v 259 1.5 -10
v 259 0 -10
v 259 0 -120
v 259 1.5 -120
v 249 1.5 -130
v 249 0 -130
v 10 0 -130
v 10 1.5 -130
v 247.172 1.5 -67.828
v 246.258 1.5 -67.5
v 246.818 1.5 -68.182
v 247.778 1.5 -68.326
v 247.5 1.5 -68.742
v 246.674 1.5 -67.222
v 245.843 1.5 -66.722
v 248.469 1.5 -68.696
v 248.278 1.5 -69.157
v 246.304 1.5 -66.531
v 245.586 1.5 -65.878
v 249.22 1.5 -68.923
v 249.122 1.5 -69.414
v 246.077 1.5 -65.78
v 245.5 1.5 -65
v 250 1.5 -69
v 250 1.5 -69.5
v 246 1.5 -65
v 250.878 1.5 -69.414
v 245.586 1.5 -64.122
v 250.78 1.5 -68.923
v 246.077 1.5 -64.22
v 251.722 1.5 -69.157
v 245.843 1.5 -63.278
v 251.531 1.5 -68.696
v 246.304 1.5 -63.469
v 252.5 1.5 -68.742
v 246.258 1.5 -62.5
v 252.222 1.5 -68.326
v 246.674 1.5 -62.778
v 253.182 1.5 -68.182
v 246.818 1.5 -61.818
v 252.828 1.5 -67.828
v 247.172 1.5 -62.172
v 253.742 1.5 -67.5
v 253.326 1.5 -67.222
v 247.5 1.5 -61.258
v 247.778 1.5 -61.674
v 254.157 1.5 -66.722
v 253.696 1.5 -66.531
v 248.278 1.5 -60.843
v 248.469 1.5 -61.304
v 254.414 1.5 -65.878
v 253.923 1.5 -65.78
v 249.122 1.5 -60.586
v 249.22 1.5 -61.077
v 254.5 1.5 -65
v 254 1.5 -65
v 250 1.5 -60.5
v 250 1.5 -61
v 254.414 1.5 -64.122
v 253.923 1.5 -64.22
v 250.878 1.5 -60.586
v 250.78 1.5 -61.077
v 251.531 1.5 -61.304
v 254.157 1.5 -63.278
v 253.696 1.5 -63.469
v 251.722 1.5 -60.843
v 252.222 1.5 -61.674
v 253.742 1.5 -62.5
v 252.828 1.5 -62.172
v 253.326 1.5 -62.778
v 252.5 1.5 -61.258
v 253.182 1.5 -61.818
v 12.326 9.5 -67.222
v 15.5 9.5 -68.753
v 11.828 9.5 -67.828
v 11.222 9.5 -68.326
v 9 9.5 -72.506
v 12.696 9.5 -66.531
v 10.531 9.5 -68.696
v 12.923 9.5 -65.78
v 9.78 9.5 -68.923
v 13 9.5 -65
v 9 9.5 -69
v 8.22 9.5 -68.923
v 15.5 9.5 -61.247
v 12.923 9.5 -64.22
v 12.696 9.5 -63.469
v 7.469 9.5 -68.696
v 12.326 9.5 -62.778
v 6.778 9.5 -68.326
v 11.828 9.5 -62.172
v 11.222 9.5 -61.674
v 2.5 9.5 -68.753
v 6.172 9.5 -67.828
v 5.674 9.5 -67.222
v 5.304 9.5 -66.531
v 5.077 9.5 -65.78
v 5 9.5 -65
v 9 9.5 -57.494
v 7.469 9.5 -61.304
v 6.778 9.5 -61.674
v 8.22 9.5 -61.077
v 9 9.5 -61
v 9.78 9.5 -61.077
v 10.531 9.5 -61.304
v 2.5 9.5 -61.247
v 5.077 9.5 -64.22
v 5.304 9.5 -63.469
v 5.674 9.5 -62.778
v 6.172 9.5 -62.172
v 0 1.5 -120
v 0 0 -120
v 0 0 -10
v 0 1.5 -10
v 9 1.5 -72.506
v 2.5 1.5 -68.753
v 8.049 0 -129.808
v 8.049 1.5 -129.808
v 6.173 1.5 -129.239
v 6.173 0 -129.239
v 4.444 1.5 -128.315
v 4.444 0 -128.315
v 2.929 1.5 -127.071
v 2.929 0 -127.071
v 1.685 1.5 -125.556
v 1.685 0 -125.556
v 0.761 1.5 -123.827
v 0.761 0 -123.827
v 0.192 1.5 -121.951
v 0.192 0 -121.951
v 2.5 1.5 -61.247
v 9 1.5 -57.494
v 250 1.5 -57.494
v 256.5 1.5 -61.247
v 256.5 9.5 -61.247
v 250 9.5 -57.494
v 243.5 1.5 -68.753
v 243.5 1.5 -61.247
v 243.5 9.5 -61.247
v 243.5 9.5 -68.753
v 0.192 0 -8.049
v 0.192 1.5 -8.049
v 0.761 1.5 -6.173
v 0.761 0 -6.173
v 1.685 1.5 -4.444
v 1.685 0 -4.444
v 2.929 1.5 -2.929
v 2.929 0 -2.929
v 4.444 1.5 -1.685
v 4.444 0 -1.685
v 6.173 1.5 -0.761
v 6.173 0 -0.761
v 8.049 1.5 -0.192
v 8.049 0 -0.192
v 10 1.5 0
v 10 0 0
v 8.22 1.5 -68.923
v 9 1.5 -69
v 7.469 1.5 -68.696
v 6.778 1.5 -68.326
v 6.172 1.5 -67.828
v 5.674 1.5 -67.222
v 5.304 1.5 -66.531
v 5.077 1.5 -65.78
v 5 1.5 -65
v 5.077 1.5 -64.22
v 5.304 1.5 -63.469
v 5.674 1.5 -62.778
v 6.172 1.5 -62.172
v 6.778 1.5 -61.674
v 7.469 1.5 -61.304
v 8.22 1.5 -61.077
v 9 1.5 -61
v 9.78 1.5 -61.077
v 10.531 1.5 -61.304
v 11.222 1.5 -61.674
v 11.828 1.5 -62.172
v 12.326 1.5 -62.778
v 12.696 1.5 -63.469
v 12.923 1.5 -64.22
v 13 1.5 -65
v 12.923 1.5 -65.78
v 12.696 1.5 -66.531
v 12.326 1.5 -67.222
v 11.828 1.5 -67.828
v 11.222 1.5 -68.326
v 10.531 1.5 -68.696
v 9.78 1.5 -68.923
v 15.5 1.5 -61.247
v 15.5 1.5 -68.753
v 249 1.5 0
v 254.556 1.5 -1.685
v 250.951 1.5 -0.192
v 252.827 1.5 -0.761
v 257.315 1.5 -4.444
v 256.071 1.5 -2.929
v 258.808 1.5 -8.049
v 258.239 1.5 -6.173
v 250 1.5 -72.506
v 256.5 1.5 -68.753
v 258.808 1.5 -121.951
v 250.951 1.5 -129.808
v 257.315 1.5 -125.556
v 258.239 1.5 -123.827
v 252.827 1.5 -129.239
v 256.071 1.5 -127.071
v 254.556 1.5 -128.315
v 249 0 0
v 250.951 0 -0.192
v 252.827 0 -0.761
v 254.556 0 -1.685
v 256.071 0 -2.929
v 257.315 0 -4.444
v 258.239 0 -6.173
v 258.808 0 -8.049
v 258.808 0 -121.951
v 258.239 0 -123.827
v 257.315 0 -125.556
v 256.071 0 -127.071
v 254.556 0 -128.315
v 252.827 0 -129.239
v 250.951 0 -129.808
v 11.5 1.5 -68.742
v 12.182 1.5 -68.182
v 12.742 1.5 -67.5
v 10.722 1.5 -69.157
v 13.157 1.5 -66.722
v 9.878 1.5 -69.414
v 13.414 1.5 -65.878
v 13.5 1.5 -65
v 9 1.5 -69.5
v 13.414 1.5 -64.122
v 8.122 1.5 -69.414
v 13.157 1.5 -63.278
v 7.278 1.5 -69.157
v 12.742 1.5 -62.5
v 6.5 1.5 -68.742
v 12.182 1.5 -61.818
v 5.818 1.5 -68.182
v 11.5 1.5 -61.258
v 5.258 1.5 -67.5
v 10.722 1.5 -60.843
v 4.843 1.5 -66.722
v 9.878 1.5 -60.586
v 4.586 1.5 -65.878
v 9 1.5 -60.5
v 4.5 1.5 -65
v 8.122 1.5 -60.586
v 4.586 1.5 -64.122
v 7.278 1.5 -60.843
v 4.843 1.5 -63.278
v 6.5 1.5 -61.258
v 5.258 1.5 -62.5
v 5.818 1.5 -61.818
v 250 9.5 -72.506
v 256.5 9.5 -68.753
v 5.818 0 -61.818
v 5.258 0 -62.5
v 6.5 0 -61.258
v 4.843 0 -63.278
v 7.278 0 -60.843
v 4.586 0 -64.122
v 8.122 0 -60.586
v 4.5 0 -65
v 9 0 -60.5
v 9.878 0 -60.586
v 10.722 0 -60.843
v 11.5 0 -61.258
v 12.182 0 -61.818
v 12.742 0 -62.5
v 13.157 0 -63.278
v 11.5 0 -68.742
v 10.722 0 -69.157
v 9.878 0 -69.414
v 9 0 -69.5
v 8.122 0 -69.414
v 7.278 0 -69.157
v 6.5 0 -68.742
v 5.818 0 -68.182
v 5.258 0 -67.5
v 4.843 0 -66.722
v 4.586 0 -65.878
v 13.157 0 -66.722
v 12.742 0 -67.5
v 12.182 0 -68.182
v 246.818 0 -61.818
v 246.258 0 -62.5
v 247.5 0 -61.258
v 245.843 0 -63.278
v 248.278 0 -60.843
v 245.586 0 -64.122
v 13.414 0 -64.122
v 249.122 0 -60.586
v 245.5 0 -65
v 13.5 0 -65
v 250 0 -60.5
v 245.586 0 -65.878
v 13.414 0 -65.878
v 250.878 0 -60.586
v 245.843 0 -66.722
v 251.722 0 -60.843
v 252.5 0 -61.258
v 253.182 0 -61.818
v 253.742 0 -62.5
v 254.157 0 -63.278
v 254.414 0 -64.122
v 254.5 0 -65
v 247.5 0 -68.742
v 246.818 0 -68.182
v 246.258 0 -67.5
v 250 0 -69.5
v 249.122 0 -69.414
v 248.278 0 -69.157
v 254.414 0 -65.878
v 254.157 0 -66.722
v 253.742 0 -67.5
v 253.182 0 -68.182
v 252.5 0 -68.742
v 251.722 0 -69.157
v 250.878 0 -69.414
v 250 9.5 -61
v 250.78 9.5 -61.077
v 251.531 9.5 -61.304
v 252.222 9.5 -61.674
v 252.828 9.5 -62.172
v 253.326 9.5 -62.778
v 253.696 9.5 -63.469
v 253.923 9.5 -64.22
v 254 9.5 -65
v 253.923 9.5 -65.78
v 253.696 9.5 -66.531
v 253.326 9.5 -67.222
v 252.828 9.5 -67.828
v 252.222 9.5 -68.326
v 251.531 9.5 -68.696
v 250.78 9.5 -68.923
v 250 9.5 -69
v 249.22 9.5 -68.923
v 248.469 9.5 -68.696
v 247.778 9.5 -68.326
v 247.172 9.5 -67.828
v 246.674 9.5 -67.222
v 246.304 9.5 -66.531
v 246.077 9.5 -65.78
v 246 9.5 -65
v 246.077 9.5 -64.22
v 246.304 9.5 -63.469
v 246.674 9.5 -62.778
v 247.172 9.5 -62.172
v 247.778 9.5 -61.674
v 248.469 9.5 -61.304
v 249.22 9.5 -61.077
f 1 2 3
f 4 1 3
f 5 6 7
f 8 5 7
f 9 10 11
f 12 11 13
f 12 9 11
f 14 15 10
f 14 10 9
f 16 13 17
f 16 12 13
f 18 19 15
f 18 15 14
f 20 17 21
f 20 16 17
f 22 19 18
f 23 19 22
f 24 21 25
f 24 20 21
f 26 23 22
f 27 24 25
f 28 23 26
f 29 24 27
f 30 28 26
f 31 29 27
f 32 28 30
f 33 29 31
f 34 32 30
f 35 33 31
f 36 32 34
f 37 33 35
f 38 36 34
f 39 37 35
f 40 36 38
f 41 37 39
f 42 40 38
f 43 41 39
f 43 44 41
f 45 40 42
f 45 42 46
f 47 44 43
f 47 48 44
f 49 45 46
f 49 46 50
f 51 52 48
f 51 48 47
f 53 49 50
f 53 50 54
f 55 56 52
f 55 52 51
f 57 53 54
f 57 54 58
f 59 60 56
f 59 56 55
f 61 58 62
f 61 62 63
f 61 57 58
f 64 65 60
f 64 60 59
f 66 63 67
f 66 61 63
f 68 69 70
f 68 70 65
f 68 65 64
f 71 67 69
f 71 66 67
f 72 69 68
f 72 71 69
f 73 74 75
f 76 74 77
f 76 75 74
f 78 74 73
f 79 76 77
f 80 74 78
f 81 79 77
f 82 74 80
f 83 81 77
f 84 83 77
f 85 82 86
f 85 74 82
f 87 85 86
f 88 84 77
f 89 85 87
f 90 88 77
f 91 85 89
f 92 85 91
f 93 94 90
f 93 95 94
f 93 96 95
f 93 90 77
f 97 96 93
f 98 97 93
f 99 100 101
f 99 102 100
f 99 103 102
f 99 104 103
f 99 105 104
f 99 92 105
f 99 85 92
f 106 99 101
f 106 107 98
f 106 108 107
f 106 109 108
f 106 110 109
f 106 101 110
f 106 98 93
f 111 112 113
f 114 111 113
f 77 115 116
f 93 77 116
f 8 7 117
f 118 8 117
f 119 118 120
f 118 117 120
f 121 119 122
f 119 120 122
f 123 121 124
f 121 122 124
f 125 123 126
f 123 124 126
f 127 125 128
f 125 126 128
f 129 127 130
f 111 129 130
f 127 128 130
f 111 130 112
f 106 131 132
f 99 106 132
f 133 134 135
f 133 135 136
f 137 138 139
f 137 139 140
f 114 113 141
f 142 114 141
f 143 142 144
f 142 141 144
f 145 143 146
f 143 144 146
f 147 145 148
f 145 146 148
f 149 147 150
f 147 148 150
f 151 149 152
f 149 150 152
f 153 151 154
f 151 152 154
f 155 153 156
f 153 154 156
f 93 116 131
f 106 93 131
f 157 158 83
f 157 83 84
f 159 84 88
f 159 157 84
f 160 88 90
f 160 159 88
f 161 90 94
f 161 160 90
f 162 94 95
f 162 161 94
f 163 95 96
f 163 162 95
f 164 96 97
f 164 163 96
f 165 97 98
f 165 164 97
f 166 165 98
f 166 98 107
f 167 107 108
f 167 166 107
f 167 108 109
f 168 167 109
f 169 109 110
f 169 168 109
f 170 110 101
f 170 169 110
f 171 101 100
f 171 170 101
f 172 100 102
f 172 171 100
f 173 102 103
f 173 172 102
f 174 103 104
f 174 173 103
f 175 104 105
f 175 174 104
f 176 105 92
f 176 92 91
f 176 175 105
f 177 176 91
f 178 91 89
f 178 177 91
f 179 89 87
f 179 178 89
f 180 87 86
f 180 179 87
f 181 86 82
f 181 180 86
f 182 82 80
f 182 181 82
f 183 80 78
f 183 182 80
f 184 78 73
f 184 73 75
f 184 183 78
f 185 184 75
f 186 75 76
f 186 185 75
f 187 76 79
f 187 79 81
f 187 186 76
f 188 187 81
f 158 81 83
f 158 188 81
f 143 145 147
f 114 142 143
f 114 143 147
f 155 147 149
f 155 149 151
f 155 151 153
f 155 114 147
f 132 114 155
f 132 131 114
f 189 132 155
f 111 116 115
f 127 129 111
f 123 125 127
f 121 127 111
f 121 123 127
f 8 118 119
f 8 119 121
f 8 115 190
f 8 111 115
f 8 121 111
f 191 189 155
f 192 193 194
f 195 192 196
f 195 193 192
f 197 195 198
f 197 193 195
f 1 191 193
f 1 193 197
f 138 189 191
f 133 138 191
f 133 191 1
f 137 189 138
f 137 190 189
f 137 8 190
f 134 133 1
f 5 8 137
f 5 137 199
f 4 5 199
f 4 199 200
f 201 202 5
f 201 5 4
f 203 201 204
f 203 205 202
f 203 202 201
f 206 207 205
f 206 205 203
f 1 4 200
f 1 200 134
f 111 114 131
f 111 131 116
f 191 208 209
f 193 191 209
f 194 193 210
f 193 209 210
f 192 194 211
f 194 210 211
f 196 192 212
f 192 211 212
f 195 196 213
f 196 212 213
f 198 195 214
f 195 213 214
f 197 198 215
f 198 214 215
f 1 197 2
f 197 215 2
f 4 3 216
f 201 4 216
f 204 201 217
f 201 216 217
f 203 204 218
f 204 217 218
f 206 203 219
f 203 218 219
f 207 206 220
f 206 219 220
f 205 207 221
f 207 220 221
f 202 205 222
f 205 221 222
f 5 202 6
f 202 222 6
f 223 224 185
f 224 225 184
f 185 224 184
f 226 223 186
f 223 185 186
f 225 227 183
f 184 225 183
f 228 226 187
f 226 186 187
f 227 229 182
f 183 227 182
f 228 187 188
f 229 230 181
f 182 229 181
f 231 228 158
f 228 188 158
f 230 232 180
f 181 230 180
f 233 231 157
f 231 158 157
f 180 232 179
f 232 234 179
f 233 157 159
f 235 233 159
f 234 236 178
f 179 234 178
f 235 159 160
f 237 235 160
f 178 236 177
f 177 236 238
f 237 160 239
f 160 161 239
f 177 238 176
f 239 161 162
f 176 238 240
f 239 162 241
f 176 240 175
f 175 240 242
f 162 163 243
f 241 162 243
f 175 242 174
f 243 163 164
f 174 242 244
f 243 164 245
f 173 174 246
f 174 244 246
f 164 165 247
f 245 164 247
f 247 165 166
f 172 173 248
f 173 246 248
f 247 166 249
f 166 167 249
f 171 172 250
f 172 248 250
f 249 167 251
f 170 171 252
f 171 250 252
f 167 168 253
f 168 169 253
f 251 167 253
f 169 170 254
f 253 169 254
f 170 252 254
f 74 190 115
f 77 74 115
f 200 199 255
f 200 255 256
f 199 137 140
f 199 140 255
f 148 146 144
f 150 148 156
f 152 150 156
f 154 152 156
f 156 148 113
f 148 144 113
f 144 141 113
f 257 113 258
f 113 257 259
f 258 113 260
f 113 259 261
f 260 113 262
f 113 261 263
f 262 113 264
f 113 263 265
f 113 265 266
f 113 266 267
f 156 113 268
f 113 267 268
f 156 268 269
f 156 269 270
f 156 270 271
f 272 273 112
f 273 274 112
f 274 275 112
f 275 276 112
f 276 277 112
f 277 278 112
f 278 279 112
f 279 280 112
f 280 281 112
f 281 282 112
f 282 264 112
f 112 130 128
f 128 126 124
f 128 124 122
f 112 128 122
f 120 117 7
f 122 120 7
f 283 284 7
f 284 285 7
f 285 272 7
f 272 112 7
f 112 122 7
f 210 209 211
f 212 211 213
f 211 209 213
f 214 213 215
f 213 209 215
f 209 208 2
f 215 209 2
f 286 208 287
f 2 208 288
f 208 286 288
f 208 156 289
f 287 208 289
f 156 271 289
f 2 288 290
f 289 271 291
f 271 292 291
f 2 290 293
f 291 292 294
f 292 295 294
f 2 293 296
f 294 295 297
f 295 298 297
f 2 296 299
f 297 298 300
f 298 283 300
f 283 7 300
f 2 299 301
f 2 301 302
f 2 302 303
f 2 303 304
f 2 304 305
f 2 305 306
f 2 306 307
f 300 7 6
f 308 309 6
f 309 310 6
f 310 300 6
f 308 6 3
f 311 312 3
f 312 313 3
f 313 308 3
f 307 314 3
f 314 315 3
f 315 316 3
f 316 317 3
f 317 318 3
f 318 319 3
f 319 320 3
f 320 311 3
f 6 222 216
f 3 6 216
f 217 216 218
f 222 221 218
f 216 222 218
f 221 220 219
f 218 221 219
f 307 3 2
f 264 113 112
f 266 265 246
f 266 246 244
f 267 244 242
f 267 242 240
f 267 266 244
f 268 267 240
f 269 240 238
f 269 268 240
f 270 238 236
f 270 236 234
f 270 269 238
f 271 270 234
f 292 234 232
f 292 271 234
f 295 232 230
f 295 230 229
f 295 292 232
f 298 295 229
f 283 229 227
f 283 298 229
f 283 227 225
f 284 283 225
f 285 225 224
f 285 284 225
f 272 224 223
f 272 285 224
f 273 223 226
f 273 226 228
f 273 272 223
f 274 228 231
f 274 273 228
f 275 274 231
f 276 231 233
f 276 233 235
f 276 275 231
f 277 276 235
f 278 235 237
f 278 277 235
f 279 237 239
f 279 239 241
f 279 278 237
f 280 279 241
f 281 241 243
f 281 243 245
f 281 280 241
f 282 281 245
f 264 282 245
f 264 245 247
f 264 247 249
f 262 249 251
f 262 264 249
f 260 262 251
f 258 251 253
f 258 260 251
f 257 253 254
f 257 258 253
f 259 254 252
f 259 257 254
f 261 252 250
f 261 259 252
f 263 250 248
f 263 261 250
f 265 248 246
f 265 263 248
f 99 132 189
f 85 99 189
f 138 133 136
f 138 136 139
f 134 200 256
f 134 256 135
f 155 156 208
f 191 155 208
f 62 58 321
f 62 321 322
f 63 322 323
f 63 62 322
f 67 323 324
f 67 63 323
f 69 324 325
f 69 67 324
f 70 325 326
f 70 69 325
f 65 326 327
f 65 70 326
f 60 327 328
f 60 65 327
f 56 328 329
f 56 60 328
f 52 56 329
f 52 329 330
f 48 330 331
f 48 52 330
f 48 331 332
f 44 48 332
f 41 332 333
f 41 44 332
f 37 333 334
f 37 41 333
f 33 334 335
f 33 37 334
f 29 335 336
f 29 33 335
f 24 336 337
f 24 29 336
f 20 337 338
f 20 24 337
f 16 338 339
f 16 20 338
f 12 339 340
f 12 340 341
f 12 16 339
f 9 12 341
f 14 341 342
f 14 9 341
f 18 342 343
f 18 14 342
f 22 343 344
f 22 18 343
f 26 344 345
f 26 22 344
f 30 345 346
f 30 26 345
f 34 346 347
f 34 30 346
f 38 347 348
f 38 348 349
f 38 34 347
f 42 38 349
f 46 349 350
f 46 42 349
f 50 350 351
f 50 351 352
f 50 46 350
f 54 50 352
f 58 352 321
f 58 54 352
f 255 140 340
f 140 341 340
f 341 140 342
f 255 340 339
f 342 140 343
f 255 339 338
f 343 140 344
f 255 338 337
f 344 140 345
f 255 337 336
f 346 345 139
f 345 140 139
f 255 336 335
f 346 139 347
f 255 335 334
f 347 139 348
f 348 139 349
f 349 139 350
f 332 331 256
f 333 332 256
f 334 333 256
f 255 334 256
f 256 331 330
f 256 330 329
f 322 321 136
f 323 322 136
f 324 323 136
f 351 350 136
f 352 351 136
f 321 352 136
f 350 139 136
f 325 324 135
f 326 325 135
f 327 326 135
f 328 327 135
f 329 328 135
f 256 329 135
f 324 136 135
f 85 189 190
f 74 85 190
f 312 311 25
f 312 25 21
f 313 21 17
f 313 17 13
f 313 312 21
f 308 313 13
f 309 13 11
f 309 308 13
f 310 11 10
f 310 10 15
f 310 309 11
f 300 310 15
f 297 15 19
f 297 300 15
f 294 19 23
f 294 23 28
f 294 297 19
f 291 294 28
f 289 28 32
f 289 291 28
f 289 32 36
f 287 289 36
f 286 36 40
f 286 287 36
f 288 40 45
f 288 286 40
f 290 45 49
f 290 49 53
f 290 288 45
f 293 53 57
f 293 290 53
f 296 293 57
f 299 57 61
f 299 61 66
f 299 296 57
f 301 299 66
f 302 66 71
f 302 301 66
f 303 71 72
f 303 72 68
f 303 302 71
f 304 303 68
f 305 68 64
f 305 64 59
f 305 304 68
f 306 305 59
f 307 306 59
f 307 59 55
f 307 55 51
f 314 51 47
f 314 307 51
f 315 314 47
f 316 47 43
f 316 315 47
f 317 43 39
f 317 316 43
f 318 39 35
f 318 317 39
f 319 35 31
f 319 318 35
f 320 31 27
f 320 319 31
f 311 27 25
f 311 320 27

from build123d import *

# Parameters (mm, degrees)
SCHIZZO1_R                   = 4.5
ESTRUSIONE_ESTRUSIONE1_DEPTH = 1.5
SCHIZZO2_R                   = 4
ESTRUSIONE_ESTRUSIONE2_DEPTH = 8


with BuildPart() as part:
    # Schizzo1 → Estrusione-Estrusione1 (new body)
    with BuildSketch(Plane(origin=(0, 0, 0), x_dir=(1, 0, 0), z_dir=(0, 1, 0))):
        with BuildLine():
            Line((10, 0), (249, 0))
            ThreePointArc((249, 0), (256.071067812, 2.928932188), (259, 10))
            Line((259, 10), (259, 120))
            ThreePointArc((259, 120), (256.071067812, 127.071067812), (249, 130))
            Line((249, 130), (10, 130))
            ThreePointArc((10, 130), (2.928932188, 127.071067812), (0, 120))
            Line((0, 120), (0, 10))
            ThreePointArc((0, 10), (2.928932188, 2.928932188), (10, 0))
        make_face()
        with Locations(Location((9, 65, 0), (0, 0, 270))):
            Circle(SCHIZZO1_R, mode=Mode.SUBTRACT)
        with Locations(Location((250, 65, 0), (0, 0, 90))):
            Circle(SCHIZZO1_R, mode=Mode.SUBTRACT)
    extrude(amount=ESTRUSIONE_ESTRUSIONE1_DEPTH)

    # Schizzo2 → Estrusione-Estrusione2 (add)
    # profile 1 of 2: a face of its own
    with BuildSketch(Plane(origin=(0, 1.5, 0), x_dir=(-1, 0, 0), z_dir=(0, 1, 0))):
        Polygon((-9, -57.494446501), (-15.5, -61.24722325), (-15.5, -68.75277675), (-9, -72.505553499), (-2.5, -68.75277675), (-2.5, -61.24722325), align=None)
        with Locations(Location((-9, -65, 0), (0, 0, 270))):
            Circle(SCHIZZO2_R, mode=Mode.SUBTRACT)
    # profile 2 of 2: a face of its own
    with BuildSketch(Plane(origin=(0, 1.5, 0), x_dir=(-1, 0, 0), z_dir=(0, 1, 0))):
        Polygon((-256.5, -61.24722325), (-250, -57.494446501), (-243.5, -61.24722325), (-243.5, -68.75277675), (-250, -72.505553499), (-256.5, -68.75277675), align=None)
        with Locations(Location((-250, -65, 0), (0, 0, 90))):
            Circle(SCHIZZO2_R, mode=Mode.SUBTRACT)
    extrude(amount=ESTRUSIONE_ESTRUSIONE2_DEPTH)


solid = part.part
